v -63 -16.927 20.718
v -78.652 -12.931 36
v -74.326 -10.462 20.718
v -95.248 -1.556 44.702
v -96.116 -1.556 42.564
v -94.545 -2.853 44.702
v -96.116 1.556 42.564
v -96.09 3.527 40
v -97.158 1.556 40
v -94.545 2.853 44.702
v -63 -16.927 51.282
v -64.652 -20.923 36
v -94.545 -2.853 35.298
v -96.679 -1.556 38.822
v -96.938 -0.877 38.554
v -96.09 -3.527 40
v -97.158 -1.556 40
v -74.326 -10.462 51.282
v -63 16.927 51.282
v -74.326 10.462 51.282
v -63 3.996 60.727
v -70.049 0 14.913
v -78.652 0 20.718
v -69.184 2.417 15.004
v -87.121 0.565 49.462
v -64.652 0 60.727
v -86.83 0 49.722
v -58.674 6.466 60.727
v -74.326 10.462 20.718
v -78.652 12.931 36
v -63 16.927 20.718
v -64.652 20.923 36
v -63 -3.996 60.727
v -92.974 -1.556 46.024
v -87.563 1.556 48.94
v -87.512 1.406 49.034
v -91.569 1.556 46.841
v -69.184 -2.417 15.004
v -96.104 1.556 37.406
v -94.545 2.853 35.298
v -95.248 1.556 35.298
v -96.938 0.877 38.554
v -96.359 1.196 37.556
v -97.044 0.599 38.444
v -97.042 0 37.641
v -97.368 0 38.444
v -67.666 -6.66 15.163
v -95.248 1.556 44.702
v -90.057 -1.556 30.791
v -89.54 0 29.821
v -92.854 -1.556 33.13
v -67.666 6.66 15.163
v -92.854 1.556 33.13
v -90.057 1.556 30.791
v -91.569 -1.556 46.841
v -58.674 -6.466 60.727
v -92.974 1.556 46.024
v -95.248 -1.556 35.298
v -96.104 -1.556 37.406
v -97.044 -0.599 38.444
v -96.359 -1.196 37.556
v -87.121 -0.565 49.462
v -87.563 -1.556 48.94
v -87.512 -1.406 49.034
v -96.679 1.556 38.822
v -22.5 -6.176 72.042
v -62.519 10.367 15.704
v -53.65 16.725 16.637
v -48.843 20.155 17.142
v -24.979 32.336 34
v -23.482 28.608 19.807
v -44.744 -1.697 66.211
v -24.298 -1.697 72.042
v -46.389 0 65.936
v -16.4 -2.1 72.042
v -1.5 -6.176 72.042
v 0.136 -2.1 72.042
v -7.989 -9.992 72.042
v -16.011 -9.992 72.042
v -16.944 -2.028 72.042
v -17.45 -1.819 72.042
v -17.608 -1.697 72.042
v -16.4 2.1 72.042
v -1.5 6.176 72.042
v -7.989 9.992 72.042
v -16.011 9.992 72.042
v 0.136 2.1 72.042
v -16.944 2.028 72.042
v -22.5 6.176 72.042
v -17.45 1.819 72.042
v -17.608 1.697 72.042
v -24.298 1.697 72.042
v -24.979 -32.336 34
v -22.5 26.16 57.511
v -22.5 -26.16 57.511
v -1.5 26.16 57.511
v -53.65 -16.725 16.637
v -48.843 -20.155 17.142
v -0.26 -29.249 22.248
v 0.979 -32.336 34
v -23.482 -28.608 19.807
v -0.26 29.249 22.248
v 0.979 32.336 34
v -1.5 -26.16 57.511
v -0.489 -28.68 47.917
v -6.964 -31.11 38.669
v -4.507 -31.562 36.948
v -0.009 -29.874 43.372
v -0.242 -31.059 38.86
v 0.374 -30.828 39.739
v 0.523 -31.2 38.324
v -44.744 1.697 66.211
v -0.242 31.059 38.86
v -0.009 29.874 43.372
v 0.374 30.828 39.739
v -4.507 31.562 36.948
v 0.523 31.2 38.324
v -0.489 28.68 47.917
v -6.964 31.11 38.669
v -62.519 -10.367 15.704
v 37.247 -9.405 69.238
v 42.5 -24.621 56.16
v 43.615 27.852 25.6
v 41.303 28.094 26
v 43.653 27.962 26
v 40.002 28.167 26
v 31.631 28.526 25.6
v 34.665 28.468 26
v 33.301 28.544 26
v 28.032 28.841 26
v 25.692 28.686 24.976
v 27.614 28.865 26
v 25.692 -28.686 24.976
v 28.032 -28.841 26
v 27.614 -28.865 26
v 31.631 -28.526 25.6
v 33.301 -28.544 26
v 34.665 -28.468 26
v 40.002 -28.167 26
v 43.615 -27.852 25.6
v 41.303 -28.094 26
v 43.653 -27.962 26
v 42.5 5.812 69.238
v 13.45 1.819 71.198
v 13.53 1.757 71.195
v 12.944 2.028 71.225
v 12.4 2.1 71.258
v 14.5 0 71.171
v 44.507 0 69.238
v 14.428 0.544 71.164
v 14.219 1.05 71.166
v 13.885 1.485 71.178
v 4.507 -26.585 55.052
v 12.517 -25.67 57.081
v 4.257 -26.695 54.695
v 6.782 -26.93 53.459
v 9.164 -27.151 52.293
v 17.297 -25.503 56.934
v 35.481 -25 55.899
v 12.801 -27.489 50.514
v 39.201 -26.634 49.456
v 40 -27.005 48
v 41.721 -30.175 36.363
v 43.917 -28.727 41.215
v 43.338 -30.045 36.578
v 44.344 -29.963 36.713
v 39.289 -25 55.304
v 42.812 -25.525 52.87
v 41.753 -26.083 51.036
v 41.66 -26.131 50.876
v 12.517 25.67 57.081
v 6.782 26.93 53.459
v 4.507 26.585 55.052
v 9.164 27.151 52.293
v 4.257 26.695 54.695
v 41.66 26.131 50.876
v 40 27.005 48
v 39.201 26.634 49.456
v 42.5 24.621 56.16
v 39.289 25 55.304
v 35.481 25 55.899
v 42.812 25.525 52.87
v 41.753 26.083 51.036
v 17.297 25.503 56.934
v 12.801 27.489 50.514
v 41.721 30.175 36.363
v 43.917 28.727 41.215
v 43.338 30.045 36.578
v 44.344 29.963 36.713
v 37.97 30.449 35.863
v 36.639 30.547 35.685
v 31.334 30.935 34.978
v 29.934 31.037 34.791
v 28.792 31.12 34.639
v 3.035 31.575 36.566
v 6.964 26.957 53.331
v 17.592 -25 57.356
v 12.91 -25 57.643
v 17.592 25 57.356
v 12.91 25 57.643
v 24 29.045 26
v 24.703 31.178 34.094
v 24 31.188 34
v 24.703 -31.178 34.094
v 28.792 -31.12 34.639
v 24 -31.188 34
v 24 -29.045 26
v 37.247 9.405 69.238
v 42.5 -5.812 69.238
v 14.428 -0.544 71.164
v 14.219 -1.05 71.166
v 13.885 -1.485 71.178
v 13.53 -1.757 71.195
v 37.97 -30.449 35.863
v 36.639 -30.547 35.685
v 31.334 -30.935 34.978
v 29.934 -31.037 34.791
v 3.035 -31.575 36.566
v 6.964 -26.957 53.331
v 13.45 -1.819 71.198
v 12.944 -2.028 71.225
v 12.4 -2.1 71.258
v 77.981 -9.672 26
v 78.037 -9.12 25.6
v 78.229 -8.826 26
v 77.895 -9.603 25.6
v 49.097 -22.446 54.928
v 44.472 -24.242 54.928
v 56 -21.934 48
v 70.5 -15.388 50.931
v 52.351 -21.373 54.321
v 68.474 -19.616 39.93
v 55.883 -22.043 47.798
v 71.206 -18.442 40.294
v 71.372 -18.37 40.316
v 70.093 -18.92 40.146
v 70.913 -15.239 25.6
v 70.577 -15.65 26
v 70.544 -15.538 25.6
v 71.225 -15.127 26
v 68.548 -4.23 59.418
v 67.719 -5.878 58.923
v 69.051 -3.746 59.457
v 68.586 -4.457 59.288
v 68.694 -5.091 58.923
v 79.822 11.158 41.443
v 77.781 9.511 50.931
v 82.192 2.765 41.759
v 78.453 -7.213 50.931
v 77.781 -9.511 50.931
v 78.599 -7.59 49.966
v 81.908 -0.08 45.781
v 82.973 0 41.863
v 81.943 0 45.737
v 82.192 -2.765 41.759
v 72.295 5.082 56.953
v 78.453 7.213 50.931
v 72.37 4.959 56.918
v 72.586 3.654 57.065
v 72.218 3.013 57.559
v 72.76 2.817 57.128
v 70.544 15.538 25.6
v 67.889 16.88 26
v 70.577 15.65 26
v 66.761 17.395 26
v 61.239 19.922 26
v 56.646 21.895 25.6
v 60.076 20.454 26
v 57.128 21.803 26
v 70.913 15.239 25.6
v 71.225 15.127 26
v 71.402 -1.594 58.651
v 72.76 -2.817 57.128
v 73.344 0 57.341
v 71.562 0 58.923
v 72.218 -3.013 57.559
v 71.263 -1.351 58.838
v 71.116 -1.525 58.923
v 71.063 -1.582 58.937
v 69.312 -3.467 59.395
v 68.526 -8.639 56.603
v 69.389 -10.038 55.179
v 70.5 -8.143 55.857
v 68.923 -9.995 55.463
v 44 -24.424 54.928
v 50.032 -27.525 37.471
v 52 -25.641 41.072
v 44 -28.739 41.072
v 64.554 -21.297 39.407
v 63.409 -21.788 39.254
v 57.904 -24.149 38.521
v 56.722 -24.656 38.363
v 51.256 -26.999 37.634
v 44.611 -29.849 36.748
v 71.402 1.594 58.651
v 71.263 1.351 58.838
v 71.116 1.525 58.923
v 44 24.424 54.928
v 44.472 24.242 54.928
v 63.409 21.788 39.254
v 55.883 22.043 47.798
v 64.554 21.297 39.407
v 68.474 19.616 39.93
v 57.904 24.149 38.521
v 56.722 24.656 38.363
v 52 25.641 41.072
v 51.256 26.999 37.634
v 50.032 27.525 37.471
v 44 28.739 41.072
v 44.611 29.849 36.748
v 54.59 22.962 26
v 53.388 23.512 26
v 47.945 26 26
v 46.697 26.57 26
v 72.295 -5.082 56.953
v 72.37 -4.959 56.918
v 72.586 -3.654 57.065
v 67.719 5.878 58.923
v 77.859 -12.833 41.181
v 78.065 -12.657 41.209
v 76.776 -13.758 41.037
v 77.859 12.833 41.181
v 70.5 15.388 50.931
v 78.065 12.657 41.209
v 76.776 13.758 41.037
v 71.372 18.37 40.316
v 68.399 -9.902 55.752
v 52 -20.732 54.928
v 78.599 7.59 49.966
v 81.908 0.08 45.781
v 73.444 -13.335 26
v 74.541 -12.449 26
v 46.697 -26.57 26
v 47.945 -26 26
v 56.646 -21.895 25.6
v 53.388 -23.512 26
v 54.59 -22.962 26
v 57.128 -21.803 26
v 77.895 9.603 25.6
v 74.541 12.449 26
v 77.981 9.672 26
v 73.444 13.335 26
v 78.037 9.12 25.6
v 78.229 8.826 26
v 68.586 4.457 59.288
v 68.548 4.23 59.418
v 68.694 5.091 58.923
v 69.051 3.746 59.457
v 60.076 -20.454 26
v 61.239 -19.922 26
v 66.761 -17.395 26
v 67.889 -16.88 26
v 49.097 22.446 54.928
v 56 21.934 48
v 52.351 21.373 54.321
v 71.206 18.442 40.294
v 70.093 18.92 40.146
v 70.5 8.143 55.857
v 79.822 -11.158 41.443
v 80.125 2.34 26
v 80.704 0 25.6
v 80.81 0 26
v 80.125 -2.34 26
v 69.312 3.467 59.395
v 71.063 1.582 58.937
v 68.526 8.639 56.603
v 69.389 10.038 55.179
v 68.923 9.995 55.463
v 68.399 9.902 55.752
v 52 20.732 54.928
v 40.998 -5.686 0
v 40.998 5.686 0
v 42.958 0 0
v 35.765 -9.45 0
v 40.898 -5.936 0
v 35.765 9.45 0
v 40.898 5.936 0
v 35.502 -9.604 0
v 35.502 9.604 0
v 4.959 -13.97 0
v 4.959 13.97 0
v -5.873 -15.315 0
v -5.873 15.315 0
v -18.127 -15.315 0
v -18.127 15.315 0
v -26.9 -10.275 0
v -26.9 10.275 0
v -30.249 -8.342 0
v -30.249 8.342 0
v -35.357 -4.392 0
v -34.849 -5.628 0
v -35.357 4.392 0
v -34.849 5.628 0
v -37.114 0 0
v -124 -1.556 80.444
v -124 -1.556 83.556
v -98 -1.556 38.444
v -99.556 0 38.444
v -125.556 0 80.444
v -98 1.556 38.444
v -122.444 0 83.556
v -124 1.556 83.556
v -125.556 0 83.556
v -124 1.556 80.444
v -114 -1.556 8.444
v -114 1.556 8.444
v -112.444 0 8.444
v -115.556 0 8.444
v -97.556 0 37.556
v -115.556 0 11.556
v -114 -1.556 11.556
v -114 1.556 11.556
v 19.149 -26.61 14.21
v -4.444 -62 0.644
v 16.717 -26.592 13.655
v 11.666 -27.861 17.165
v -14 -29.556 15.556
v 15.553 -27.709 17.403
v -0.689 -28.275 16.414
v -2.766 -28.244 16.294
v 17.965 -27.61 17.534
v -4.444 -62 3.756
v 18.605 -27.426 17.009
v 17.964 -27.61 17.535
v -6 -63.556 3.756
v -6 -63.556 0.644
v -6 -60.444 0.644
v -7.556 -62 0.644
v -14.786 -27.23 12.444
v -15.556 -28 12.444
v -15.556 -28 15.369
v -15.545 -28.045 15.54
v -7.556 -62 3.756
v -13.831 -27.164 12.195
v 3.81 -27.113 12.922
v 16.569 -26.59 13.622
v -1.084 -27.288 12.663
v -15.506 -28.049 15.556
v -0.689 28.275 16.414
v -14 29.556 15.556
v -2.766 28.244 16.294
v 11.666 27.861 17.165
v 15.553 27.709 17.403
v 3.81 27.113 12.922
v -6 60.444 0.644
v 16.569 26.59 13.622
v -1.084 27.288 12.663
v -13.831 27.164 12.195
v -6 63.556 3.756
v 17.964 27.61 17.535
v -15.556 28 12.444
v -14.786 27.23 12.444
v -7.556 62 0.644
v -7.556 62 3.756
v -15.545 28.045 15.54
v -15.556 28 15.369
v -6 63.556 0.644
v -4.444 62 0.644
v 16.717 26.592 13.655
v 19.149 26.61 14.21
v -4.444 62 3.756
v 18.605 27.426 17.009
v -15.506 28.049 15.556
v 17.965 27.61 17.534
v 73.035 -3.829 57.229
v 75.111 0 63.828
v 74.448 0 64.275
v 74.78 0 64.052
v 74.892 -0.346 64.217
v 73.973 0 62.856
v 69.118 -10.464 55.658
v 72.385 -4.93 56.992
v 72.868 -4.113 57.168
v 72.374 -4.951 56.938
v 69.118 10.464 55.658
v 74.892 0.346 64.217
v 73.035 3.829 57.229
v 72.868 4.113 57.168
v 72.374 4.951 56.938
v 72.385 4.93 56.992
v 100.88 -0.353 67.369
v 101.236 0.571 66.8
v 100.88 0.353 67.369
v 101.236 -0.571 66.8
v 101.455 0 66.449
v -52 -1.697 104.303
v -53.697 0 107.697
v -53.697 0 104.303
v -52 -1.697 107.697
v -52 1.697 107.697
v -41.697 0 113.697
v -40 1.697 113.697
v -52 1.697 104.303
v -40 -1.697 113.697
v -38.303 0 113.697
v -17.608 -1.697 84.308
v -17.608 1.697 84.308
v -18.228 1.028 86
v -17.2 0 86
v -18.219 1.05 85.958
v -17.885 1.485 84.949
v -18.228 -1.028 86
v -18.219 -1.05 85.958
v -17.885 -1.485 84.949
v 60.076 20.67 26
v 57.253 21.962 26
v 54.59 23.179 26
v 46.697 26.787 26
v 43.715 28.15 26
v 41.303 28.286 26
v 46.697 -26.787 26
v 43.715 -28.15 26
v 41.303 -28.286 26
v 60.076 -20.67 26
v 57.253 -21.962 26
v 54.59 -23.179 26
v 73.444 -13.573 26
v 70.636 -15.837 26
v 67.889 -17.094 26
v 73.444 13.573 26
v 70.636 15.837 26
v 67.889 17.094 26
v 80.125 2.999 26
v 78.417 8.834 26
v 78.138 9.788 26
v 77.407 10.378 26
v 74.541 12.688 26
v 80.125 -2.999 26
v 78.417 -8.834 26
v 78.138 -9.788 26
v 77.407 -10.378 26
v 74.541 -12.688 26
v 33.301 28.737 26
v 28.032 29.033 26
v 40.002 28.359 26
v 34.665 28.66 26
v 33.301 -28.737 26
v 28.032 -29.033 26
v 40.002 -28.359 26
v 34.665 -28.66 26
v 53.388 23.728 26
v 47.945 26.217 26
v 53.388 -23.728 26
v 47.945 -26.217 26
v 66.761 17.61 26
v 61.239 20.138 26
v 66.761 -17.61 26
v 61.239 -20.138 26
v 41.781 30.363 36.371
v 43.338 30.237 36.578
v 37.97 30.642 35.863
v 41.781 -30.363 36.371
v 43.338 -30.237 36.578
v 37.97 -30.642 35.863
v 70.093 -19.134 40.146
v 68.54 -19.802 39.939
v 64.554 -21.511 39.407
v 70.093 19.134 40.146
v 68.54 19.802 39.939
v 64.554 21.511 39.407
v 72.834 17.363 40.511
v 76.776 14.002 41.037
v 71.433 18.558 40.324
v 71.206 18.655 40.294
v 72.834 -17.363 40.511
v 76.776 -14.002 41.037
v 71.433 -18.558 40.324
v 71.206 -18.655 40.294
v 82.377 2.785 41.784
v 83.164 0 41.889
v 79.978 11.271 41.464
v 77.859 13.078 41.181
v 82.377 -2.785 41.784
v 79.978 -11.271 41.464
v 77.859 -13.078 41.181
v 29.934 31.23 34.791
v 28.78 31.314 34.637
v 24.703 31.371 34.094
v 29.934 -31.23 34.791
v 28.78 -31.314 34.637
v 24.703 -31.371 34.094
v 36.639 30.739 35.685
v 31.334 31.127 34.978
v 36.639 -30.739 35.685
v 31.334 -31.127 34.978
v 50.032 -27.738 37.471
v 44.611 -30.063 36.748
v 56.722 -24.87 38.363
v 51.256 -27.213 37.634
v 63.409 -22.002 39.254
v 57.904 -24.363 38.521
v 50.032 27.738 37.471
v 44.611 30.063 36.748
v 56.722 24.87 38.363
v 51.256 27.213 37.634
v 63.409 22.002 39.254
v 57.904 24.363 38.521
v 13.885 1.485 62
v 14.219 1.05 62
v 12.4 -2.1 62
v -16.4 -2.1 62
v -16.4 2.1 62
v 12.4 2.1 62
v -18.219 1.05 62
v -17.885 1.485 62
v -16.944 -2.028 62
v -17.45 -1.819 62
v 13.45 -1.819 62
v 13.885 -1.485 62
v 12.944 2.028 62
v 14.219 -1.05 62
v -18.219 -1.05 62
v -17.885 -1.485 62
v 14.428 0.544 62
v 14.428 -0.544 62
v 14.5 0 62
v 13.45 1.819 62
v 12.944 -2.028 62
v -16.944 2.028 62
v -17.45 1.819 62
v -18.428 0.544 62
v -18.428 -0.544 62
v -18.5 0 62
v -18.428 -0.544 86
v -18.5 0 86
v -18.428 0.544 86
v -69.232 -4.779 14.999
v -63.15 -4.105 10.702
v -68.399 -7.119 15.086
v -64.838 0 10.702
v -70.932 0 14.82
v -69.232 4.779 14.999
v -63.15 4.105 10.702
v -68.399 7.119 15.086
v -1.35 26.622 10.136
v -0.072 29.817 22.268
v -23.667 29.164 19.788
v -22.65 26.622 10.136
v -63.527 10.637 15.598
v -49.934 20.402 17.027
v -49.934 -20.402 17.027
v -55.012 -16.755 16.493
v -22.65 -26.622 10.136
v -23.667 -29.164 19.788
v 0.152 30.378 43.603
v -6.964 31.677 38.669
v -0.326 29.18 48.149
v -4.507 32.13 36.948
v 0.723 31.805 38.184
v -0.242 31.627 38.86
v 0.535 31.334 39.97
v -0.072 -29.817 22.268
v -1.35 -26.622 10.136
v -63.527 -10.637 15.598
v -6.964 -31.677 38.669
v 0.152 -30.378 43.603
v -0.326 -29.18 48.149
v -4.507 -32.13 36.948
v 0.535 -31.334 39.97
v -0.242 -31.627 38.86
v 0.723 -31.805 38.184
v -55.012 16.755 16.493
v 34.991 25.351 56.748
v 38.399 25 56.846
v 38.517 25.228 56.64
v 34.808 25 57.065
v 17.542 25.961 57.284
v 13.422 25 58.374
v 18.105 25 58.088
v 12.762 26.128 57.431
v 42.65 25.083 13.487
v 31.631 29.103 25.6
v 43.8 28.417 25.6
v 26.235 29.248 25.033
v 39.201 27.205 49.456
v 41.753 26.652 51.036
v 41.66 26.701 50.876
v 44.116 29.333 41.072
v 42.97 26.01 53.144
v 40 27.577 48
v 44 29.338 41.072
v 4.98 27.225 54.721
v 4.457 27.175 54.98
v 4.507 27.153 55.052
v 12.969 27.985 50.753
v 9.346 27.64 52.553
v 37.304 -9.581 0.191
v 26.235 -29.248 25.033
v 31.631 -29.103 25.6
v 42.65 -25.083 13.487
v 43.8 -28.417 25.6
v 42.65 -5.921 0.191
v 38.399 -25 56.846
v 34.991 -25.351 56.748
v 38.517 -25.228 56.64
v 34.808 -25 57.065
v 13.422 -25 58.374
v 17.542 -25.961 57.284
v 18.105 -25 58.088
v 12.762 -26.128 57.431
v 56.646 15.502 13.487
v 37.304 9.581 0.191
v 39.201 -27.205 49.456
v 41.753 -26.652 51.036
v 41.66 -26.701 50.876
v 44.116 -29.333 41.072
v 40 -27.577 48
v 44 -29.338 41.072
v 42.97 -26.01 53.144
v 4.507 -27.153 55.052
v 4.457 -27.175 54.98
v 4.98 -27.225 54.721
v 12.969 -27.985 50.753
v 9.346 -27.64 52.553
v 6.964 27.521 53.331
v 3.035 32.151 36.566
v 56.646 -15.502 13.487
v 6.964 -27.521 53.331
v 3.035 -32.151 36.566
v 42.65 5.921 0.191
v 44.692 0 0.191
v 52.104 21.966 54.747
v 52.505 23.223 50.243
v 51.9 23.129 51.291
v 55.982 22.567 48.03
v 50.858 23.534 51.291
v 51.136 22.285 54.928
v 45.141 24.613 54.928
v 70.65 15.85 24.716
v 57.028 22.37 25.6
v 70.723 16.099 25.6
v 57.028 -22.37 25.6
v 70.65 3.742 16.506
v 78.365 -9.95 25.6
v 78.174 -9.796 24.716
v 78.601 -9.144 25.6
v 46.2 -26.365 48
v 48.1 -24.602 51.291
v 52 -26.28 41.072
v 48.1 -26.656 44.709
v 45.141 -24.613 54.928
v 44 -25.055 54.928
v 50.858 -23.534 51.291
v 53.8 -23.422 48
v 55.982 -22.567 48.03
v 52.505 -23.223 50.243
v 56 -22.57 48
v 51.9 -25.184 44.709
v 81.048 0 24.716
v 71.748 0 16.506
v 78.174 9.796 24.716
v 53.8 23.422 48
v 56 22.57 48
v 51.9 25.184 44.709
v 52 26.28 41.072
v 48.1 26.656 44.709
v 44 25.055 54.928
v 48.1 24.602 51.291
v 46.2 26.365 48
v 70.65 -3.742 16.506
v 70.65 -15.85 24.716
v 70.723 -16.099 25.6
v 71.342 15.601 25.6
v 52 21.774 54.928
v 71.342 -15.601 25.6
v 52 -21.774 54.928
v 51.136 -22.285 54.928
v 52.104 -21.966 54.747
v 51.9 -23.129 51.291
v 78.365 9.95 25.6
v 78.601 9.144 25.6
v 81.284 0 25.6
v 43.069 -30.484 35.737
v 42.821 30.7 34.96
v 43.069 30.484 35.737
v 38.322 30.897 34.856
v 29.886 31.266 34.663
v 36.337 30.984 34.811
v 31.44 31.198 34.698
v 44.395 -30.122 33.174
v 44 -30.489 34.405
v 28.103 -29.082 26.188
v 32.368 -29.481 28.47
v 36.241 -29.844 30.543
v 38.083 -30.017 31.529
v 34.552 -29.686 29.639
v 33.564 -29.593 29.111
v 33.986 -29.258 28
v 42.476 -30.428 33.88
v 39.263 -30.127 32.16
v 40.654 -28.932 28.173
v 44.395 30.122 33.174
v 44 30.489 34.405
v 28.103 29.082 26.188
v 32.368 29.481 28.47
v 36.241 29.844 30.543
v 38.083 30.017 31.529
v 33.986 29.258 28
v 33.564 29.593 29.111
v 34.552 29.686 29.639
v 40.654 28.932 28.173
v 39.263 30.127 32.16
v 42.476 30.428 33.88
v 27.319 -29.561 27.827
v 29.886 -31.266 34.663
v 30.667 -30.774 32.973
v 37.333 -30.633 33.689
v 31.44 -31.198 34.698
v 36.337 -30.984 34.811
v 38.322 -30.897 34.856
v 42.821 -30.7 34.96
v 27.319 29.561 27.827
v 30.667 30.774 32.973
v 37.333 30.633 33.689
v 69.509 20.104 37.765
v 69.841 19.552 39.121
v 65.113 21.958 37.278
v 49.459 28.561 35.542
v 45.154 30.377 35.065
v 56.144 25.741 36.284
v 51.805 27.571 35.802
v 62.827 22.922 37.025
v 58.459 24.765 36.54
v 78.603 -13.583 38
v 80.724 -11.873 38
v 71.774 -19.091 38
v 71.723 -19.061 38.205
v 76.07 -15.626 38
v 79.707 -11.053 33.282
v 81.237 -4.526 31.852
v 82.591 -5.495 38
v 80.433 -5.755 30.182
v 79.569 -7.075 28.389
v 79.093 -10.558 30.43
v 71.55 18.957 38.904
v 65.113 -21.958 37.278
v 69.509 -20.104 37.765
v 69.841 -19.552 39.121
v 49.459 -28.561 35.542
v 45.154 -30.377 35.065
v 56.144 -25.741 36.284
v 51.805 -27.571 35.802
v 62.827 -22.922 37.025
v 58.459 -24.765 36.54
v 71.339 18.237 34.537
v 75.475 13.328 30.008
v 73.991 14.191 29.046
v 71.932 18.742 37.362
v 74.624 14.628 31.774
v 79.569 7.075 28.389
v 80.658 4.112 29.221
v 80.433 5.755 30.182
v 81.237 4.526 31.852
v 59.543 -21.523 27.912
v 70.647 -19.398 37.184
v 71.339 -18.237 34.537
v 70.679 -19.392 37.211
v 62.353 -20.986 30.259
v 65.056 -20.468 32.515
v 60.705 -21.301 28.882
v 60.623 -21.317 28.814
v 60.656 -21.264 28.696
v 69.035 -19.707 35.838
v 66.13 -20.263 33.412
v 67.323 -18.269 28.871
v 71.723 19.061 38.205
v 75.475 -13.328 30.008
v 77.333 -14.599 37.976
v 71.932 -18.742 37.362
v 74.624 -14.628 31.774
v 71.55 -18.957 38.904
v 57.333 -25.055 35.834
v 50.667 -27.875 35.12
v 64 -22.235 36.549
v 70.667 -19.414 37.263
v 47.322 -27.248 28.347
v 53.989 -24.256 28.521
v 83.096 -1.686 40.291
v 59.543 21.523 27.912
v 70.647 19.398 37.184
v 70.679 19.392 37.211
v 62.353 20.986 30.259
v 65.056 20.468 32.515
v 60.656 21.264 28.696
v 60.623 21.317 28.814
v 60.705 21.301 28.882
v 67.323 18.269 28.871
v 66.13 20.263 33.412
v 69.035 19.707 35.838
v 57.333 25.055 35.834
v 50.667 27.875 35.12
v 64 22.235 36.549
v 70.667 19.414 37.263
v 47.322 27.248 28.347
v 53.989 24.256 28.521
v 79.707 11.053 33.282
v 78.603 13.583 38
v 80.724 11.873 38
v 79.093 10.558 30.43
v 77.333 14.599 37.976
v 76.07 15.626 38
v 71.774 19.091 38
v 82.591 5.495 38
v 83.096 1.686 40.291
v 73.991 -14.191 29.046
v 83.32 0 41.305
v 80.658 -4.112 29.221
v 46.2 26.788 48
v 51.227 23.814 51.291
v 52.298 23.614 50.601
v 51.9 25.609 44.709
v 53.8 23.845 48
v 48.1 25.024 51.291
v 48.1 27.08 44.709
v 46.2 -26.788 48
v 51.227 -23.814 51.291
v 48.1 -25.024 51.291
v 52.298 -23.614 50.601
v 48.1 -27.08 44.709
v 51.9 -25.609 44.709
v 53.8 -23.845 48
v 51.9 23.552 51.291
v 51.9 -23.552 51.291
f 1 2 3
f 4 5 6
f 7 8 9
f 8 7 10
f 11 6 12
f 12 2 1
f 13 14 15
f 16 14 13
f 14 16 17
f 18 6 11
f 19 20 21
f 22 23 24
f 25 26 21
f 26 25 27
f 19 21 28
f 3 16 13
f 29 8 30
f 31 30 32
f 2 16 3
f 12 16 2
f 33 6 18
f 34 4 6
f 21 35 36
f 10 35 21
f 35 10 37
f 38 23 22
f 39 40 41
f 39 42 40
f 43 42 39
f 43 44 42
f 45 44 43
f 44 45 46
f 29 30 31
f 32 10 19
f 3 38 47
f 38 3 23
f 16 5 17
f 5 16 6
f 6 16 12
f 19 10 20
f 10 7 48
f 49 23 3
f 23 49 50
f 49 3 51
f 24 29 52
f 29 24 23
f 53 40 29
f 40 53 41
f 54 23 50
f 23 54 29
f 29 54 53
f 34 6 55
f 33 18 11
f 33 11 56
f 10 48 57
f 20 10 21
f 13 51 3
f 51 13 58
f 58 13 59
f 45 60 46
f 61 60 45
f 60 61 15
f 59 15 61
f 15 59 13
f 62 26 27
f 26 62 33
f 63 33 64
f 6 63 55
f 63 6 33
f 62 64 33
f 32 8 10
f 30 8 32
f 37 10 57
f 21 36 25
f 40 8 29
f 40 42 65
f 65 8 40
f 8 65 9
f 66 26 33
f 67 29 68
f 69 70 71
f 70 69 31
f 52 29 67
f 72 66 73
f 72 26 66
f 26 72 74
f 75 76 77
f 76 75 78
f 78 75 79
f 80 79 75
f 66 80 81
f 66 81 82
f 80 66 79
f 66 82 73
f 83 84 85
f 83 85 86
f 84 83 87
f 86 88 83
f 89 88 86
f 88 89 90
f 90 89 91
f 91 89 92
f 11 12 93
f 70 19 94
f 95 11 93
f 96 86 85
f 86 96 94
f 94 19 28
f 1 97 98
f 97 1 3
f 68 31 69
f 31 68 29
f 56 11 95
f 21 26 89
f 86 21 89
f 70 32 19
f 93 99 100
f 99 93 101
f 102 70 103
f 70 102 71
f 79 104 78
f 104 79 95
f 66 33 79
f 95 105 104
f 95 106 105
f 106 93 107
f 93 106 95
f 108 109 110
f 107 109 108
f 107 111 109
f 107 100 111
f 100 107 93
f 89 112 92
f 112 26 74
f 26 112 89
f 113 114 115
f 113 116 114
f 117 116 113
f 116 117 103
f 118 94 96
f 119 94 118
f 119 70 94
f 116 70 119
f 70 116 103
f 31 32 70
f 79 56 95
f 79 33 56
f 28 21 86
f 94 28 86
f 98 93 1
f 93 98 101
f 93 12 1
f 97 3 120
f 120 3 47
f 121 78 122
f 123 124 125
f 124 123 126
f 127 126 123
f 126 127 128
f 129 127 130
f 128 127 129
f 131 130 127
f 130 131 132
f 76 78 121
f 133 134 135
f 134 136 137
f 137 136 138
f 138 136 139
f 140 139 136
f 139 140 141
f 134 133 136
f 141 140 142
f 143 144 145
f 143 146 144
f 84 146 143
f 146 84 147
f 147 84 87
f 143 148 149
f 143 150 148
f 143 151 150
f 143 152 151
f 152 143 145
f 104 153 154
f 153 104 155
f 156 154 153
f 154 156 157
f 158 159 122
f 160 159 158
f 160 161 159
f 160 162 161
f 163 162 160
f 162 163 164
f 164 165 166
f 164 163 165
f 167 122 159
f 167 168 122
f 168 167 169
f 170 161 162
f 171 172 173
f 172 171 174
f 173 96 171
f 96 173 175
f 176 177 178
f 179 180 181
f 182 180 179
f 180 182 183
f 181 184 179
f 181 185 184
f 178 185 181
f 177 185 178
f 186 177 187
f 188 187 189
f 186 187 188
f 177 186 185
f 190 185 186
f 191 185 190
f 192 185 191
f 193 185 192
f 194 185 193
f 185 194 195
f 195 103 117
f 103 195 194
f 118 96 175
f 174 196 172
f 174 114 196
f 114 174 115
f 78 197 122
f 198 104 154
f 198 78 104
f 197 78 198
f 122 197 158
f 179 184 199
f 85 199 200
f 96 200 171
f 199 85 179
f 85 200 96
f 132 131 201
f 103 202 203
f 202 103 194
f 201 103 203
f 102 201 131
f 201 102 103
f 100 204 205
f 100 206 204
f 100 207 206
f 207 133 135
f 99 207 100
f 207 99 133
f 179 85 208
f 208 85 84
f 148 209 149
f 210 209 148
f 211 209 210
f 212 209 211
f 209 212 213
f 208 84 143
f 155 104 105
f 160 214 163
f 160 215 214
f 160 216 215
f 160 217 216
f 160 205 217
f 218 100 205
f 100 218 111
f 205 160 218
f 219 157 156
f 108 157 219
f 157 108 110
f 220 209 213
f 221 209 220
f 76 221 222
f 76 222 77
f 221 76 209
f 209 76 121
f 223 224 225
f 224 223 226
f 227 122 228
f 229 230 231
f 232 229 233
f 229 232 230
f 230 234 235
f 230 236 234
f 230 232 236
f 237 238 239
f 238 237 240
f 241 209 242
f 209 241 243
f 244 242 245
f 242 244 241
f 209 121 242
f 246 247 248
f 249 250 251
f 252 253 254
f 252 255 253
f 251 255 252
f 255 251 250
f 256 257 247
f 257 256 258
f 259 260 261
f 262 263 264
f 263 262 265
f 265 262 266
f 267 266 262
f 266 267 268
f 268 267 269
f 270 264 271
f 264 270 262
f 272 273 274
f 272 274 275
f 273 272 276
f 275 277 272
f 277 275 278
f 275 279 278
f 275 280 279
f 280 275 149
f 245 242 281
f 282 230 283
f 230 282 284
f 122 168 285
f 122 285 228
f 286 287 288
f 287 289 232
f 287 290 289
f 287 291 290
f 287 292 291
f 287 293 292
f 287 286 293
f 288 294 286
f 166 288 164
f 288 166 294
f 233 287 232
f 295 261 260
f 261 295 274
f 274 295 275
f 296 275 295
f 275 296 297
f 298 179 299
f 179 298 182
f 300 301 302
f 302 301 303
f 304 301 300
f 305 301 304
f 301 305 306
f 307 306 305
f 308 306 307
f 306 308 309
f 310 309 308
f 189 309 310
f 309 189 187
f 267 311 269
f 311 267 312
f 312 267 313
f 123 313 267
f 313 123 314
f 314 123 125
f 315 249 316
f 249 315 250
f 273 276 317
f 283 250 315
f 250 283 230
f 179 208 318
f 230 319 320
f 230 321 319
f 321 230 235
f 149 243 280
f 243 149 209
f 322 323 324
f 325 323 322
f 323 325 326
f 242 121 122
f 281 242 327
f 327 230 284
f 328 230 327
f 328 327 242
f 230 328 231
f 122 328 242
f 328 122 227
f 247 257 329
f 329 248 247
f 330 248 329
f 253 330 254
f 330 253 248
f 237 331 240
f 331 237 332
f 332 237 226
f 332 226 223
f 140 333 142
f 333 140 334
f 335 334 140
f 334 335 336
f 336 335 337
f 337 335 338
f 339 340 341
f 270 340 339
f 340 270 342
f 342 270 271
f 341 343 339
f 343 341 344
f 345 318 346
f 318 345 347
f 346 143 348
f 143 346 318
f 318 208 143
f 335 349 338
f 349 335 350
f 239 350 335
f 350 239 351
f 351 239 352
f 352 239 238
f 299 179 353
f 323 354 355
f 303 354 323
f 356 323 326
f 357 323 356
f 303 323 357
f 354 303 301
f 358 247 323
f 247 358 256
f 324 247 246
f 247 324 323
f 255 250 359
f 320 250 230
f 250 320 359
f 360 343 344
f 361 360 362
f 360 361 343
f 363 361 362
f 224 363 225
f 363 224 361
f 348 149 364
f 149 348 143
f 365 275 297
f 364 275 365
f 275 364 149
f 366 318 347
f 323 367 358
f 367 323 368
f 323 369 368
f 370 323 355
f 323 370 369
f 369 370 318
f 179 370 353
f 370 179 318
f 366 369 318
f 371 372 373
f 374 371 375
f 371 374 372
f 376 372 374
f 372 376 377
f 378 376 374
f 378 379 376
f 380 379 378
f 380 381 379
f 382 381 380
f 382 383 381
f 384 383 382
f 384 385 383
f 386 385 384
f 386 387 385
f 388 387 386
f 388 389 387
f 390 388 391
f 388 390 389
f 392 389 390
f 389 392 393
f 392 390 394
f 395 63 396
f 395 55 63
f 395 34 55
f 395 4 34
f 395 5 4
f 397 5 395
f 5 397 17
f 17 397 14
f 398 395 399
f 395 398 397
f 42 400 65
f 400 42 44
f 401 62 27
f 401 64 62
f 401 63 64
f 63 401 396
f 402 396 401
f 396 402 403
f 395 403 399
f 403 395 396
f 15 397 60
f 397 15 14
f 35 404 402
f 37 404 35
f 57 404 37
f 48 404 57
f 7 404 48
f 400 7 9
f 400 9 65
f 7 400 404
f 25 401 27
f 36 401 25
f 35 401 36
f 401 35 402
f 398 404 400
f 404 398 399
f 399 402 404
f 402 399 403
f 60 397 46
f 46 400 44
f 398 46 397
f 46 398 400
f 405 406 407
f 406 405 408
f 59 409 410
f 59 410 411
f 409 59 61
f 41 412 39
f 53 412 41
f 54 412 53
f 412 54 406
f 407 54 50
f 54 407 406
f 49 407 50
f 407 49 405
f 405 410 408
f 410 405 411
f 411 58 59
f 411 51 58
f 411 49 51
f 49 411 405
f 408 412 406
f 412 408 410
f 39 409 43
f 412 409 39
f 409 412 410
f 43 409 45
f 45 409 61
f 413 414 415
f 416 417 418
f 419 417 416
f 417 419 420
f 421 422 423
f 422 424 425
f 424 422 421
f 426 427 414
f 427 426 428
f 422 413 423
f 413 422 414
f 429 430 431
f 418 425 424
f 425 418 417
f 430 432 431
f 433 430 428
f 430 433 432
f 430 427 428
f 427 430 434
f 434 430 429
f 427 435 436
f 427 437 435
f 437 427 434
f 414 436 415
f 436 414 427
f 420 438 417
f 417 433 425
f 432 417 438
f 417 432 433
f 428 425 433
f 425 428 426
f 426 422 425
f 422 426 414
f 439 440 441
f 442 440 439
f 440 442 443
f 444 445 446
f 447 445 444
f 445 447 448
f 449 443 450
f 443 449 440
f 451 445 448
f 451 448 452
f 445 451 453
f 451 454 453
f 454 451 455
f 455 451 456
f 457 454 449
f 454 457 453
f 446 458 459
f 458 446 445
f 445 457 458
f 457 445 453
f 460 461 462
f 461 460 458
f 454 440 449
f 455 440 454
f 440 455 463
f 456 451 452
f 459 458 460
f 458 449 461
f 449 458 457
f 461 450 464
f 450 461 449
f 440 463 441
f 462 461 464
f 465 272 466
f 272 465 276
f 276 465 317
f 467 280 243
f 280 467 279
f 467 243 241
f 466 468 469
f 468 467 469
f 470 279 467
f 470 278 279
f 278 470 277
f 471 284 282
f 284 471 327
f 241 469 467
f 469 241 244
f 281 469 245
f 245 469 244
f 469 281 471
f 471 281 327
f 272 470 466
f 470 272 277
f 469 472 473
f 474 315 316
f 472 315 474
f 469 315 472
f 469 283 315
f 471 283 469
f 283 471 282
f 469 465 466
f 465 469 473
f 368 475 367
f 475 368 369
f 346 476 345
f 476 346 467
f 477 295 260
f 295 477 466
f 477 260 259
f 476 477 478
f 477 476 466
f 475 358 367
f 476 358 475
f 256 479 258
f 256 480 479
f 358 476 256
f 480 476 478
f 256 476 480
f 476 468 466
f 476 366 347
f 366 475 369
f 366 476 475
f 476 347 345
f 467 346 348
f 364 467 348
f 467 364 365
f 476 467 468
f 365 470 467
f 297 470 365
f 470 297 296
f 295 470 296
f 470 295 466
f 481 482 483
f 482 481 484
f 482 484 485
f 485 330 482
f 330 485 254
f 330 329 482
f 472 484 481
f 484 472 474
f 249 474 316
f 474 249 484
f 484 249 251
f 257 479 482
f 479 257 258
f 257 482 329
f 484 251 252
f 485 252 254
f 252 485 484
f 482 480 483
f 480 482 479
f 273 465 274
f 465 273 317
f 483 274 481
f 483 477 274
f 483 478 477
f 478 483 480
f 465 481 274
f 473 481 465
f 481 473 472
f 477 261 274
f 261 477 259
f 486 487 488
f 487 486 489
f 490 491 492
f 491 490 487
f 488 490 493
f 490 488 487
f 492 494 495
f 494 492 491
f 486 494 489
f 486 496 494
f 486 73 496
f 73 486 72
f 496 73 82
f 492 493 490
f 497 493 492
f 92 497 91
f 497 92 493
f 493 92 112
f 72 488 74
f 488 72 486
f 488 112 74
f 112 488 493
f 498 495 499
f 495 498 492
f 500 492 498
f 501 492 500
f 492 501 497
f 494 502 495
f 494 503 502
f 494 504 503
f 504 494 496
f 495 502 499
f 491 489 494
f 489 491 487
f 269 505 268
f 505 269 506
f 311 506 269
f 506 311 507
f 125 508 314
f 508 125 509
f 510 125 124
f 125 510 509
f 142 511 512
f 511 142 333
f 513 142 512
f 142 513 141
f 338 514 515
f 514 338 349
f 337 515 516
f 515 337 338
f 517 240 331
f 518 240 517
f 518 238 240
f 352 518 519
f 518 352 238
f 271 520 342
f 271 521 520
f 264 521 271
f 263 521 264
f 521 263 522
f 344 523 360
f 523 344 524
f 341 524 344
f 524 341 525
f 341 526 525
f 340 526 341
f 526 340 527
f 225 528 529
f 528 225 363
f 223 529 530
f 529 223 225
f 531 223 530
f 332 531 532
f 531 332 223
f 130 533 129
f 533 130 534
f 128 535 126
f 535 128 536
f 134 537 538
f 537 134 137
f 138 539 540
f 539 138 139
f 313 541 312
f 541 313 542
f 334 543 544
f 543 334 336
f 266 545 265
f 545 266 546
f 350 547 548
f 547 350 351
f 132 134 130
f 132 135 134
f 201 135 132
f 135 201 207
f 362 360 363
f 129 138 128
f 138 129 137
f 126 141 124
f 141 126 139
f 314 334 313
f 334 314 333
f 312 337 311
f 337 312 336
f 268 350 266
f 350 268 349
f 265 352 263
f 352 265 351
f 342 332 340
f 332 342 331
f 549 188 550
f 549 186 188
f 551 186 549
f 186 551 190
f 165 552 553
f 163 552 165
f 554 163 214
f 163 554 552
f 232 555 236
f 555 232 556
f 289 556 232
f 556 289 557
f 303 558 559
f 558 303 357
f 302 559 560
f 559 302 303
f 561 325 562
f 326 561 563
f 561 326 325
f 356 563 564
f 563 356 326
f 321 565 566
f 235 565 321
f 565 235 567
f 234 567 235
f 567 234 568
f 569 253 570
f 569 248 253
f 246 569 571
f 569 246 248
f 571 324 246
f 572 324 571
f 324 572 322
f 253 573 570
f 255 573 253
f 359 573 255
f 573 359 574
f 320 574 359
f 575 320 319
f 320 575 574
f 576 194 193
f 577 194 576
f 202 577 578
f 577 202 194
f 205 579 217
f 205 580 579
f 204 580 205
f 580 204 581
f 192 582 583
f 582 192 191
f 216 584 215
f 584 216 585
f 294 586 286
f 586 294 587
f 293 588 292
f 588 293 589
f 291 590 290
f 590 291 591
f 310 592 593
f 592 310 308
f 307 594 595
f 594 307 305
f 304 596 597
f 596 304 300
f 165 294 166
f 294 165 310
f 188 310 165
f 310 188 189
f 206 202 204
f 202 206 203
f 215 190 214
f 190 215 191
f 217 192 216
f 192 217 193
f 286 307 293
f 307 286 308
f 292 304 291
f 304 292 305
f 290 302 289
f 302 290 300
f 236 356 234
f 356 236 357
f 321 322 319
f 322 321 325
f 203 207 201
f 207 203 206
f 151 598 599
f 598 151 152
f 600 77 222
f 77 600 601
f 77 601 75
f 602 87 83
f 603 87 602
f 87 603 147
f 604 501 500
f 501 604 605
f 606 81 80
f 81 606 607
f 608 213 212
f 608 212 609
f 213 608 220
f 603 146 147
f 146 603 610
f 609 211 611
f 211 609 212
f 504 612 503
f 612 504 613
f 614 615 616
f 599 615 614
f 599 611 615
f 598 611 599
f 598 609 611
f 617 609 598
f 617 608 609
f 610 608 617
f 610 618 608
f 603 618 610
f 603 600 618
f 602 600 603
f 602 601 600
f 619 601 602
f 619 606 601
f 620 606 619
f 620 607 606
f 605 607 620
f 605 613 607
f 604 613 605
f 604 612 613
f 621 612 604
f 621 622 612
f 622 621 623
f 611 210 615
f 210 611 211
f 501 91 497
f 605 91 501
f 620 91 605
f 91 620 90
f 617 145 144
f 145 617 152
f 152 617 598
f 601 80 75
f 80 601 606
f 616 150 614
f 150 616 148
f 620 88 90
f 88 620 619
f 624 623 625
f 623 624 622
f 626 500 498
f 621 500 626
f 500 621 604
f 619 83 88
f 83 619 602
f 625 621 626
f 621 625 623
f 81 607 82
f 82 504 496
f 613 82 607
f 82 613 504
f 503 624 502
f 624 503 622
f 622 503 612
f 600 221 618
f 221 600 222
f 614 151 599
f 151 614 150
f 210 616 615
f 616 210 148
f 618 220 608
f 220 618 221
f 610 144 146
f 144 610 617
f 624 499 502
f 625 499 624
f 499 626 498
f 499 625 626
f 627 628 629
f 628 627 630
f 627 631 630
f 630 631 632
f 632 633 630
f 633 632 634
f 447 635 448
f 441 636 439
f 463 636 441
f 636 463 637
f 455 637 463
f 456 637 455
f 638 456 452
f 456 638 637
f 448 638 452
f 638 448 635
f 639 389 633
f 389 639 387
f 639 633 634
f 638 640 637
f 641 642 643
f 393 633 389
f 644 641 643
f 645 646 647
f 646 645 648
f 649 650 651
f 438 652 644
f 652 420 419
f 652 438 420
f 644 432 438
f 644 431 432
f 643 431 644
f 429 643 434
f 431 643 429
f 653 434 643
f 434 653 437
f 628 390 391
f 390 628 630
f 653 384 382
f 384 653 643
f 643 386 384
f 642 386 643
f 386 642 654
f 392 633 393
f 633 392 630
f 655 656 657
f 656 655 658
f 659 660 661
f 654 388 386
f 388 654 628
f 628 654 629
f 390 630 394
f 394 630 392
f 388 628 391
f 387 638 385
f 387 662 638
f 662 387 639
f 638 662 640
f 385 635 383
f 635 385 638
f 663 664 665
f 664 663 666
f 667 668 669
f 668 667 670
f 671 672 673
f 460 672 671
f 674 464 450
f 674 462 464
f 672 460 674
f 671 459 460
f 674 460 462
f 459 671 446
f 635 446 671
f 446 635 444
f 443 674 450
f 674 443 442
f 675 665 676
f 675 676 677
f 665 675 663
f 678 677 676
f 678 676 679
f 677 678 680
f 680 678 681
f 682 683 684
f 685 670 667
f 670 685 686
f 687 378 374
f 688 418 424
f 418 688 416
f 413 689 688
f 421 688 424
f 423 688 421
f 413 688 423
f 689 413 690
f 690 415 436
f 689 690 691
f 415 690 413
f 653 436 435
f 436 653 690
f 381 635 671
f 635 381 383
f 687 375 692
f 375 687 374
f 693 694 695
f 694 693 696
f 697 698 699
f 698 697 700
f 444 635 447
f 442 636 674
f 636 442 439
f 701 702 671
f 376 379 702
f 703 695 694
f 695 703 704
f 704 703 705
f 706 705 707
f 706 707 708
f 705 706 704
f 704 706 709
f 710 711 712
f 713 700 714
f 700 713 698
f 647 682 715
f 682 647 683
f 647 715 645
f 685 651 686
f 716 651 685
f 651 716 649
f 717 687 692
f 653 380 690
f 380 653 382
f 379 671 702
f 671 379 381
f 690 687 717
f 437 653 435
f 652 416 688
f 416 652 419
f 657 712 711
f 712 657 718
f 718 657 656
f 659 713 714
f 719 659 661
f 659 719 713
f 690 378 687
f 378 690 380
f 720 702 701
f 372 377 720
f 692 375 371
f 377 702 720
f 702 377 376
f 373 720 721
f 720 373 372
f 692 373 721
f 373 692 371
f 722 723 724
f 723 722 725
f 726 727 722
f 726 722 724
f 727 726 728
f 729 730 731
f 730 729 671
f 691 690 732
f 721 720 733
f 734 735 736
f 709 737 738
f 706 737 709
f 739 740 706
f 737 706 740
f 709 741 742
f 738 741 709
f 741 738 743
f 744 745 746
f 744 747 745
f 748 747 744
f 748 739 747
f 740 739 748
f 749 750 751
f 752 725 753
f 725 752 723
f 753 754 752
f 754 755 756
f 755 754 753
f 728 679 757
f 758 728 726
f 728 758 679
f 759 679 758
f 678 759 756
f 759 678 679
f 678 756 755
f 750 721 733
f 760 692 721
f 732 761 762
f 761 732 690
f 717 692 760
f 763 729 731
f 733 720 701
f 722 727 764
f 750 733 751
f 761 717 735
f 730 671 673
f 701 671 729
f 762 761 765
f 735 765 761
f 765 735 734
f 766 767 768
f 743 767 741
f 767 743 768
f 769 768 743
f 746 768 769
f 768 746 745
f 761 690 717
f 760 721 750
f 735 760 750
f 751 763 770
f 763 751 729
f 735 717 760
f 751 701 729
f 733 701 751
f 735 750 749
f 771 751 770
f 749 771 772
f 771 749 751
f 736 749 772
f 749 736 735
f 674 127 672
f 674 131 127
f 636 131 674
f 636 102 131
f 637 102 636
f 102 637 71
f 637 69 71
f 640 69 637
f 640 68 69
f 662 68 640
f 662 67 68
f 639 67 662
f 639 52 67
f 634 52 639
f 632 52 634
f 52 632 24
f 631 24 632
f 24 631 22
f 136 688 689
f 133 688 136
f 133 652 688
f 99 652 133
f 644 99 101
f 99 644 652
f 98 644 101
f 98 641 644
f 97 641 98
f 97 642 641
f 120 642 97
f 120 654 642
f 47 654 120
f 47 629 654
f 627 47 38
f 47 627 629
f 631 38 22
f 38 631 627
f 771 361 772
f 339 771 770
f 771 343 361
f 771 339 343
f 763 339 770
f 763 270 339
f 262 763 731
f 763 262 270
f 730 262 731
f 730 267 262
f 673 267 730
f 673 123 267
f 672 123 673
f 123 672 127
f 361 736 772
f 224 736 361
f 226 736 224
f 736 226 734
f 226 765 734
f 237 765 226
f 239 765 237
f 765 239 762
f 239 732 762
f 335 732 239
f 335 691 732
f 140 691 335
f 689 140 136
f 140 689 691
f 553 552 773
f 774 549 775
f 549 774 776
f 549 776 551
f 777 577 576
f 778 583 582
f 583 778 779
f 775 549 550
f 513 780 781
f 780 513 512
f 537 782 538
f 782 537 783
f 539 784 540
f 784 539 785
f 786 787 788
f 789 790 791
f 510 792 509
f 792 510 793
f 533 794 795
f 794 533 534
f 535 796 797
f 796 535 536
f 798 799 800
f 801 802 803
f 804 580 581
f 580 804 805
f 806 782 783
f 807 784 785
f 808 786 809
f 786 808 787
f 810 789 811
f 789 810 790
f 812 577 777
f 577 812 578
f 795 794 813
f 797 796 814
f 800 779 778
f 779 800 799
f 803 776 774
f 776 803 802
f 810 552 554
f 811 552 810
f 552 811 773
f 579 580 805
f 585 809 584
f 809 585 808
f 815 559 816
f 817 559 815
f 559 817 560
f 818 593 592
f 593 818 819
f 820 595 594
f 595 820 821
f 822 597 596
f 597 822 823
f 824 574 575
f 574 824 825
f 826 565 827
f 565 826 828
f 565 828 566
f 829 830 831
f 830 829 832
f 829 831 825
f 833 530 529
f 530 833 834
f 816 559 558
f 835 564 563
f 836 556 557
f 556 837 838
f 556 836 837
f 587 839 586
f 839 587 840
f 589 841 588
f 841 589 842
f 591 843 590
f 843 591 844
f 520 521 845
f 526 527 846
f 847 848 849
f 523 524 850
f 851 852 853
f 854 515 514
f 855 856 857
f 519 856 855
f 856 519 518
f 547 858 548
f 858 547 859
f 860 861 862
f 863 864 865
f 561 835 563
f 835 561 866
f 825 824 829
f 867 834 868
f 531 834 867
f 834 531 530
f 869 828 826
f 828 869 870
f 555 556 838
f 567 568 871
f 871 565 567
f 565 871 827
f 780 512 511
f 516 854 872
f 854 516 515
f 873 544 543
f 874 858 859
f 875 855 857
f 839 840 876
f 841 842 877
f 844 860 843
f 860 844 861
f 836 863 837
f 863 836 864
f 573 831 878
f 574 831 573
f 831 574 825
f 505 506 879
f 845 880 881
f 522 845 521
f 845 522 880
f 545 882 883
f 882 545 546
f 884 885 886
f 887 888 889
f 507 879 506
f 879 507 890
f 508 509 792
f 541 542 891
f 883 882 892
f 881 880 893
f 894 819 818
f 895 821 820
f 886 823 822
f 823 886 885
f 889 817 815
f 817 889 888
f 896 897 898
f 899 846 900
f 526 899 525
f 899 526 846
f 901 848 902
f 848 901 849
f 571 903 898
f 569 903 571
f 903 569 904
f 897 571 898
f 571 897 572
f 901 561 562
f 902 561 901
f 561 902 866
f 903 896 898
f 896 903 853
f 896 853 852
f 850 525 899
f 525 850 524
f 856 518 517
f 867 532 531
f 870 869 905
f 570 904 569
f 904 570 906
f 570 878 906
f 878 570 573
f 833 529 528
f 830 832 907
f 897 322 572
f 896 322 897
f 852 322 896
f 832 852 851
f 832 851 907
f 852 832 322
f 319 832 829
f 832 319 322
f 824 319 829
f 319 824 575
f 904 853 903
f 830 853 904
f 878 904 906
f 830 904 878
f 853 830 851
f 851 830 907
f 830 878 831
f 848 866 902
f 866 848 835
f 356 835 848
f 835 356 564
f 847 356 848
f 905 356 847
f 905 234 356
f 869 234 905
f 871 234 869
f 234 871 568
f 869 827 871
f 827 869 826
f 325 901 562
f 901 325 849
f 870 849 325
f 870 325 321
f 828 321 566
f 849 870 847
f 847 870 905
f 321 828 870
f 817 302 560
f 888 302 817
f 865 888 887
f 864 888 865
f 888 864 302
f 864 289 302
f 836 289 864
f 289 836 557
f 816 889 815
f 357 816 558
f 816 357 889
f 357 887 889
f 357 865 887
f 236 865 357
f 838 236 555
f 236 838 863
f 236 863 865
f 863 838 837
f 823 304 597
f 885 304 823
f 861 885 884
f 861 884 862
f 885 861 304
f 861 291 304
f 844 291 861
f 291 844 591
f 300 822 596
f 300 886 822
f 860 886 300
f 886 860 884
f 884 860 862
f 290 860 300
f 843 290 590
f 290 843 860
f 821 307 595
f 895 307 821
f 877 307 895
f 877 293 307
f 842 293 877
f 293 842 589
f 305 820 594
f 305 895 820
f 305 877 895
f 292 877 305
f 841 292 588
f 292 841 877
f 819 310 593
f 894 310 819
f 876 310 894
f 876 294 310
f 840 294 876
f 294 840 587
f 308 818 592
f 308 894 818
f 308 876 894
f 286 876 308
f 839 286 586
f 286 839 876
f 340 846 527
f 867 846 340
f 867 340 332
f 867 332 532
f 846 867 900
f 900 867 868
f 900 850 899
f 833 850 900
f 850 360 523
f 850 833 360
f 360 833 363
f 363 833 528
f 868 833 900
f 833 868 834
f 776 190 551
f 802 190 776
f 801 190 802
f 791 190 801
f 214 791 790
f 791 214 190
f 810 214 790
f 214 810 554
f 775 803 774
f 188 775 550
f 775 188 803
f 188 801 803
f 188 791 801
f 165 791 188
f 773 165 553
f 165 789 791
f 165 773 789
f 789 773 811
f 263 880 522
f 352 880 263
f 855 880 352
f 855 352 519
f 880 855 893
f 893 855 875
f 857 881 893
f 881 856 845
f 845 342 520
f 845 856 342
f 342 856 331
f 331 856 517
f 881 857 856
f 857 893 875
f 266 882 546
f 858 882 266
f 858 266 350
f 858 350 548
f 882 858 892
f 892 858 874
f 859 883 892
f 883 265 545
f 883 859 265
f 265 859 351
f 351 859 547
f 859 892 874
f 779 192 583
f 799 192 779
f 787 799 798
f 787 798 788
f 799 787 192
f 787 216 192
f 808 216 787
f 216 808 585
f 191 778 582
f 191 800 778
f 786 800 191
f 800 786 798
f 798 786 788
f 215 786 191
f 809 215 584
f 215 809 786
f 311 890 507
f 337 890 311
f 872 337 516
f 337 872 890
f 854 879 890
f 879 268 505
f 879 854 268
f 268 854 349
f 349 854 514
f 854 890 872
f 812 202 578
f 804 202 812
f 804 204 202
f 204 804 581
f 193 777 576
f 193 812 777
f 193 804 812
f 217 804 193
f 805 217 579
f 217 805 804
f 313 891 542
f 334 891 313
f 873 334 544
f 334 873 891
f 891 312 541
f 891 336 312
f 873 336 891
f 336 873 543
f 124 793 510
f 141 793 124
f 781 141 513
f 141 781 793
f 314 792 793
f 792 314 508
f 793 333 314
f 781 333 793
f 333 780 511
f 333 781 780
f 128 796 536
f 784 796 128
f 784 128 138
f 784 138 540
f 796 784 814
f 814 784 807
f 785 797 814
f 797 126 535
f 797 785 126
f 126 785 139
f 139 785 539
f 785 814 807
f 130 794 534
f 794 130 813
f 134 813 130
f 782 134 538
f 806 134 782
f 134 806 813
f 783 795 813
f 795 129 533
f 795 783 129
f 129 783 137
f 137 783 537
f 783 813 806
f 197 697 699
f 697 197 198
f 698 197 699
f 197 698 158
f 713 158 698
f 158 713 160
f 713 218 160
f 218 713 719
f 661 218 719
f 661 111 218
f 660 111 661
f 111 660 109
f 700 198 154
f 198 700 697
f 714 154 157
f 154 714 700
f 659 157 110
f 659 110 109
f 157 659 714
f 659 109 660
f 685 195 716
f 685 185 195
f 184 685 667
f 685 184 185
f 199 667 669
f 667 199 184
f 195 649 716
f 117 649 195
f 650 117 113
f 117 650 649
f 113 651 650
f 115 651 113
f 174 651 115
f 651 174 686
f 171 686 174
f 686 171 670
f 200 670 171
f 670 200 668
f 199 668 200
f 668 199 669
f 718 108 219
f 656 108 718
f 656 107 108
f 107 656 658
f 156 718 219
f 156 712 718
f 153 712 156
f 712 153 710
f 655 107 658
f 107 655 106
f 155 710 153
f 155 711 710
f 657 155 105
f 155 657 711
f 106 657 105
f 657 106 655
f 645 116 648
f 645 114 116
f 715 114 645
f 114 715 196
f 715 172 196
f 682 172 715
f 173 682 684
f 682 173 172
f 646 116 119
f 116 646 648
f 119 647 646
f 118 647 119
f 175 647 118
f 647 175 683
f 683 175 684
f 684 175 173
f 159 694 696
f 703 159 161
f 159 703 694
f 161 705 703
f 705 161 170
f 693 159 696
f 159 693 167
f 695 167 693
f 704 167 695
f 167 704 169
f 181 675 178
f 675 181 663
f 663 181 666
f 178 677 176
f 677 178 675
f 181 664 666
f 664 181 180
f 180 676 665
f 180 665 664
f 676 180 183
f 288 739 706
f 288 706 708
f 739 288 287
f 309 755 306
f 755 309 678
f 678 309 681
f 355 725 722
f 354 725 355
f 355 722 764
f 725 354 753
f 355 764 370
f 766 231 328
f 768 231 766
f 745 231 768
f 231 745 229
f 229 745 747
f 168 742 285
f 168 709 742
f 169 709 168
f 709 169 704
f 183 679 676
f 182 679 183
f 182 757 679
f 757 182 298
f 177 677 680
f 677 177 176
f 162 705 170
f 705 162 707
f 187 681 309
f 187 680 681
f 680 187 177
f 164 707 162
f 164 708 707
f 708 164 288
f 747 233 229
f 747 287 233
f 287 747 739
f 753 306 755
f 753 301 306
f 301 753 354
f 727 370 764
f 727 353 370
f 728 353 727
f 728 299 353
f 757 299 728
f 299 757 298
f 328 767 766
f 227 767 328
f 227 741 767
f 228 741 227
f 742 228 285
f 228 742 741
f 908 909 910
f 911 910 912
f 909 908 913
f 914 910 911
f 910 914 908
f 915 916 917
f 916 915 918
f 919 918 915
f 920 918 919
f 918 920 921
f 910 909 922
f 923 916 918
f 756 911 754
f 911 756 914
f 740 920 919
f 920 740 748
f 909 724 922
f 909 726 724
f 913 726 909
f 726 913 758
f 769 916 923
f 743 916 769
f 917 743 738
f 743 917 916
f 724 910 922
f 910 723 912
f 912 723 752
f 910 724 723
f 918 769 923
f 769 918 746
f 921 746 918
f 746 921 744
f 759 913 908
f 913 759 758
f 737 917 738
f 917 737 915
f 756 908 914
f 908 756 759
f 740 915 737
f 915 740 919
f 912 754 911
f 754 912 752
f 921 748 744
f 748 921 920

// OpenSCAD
// file: lib/bank_common.scad
// Shared parts for the Mega Sharpedo coin banks.
// Units: millimetres. Target printer: any FDM printer, 0.2 mm layers.

// ---- Palette (Mega Sharpedo) -------------------------------------------
C_NAVY   = [0.11, 0.20, 0.42];   // upper body
C_BLUE   = [0.18, 0.33, 0.62];   // fin highlights
C_RED    = [0.72, 0.13, 0.16];   // lower jaw / underside
C_MAW    = [0.35, 0.03, 0.06];   // inside of the mouth
C_CREAM  = [0.96, 0.92, 0.80];   // belly band
C_YELLOW = [1.00, 0.80, 0.10];   // nose drill, scars, eye ring
C_WHITE  = [0.98, 0.98, 0.96];   // teeth
C_BLACK  = [0.05, 0.05, 0.07];   // pupils
C_WATER  = [0.30, 0.62, 0.85];   // splash base
C_FOAM   = [0.90, 0.96, 1.00];

// ---- Print settings -----------------------------------------------------
WALL        = 2.4;   // shell thickness
SLOT_LEN    = 33;    // fits every US / EUR / GBP coin up to a US half dollar
SLOT_W      = 4.2;
PLUG_R      = 20;    // through-hole radius in the floor
PLUG_FLOOR  = 3;     // floor thickness the plug locks against
PLUG_CLEAR  = 0.3;   // fit clearance per side

// Ellipsoid "blob": p = [x, z, rx, ry, rz]
module blob(p, inset = 0, fn = 48)
    translate([p[0], 0, p[1]])
        scale([max(p[2] - inset, 0.5), max(p[3] - inset, 0.5), max(p[4] - inset, 0.5)])
            sphere(1, $fn = fn);

// Smooth sweep through a list of blobs (hull of consecutive pairs).
module spine(pts, inset = 0, fn = 48)
    for (i = [0 : len(pts) - 2])
        hull() { blob(pts[i], inset, fn); blob(pts[i + 1], inset, fn); }

// Rounded fin: hull of small spheres placed at the given 3D points.
module fin(pts, r = 2.2, fn = 16)
    hull() for (p = pts) translate(p) sphere(r, $fn = fn);

// Cone tooth pointing along +Z from its base.
module tooth(h = 6, r = 2.4)
    cylinder(h = h, r1 = r, r2 = 0.25, $fn = 12);

// Coin slot cutter, long axis along X, centred at origin, cuts along Z.
module coin_slot(depth = 40)
    hull() for (s = [-1, 1])
        translate([s * (SLOT_LEN - SLOT_W) / 2, 0, -depth / 2])
            cylinder(h = depth, d = SLOT_W, $fn = 24);

// Bayonet socket cut into a floor whose underside sits at z = 0.
// Two notches let the plug lugs through; a quarter turn locks it.
module plug_socket() {
    translate([0, 0, -1]) cylinder(h = PLUG_FLOOR + 2, r = PLUG_R, $fn = 96);
    for (a = [0, 180]) rotate(a)
        translate([PLUG_R - 2, -5.5, -1]) cube([6.5, 11, PLUG_FLOOR + 2]);
}

// Matching twist-lock plug, printed cap-down (flat on the bed).
module plug() {
    r = PLUG_R - PLUG_CLEAR;
    cap = 4;
    difference() {
        cylinder(h = cap, r = PLUG_R + 6, $fn = 96);
        // finger groove on the outside face for twisting
        translate([-PLUG_R, -2.5, -1]) cube([2 * PLUG_R, 5, 2.6]);
    }
    translate([0, 0, cap]) cylinder(h = PLUG_FLOOR + 0.4, r = r, $fn = 96);
    translate([0, 0, cap + PLUG_FLOOR + 0.4])
        difference() {
            cylinder(h = 2.2, r = r, $fn = 96);
            translate([0, 0, -1]) cylinder(h = 4, r = r - 3, $fn = 96);
        }
    for (a = [0, 180]) rotate(a)                                   // lugs
        translate([r - 3, -5, cap + PLUG_FLOOR + 0.4]) cube([6, 10, 2.2]);
}
// main file
// Mega Sharpedo coin bank — Design 3: "Torpedo"
// A faceted, low-poly take on the classic piggy-bank pose: the shark lies
// level, standing on its belly and pectoral fins, with a locked jagged grin.
// Coin slot on the back, twist-lock plug in the belly.
//
//   part = "preview"  coloured assembly (F5)
//   part = "bank"     printable shell (F6, export STL; prints upright)
//   part = "plug"     twist-lock plug (print cap-down)

include <lib/bank_common.scad>

part = "preview";

FACETS = 10;   // lower = chunkier low-poly look

// [x, z, rx, ry, rz], nose toward +X
BODY = [
    [-88, 40, 10,  6,  8],
    [-56, 36, 28, 22, 26],
    [-12, 34, 42, 34, 40],
    [ 34, 35, 34, 32, 36],
    [ 66, 38, 18, 20, 22],
];

module envelope(inset = 0)
    intersection() {
        spine(BODY, inset, FACETS);
        translate([-200, -200, inset > 0 ? PLUG_FLOOR : 0]) cube(400);
    }

// The closed grin: a sloped band across the snout.
GRIN_TOP = [[24, 34], [84, 42]];
GRIN_BOT = [[24, 26], [84, 26]];
module grin_band(grow = 0)
    rotate([90, 0, 0]) linear_extrude(height = 100, center = true)
        offset(delta = grow) polygon([GRIN_BOT[0], GRIN_BOT[1], GRIN_TOP[1], GRIN_TOP[0]]);

function lerp(a, b, t) = a + (b - a) * t;

// Interlocking triangle teeth filling the grin band.
module teeth() {
    n = 9;
    intersection() {
        envelope(-0.2);
        grin_band();
        rotate([90, 0, 0]) linear_extrude(height = 100, center = true) offset(delta = -0.3)
            for (i = [0 : n - 1]) {
                t0 = i / n; t1 = (i + 1) / n; tm = (i + 0.5) / n;
                // upper fang hangs from the top edge
                polygon([lerp(GRIN_TOP[0], GRIN_TOP[1], t0) + [0, 1],
                         lerp(GRIN_TOP[0], GRIN_TOP[1], t1) + [0, 1],
                         lerp(lerp(GRIN_BOT[0], GRIN_BOT[1], tm), lerp(GRIN_TOP[0], GRIN_TOP[1], tm), 0.12)]);
                // lower fang rises between them
                if (i < n - 1)
                    polygon([lerp(GRIN_BOT[0], GRIN_BOT[1], tm) - [0, 1],
                             lerp(GRIN_BOT[0], GRIN_BOT[1], tm + 1 / n) - [0, 1],
                             lerp(lerp(GRIN_BOT[0], GRIN_BOT[1], t1), lerp(GRIN_TOP[0], GRIN_TOP[1], t1), 0.88)]);
            }
    }
}

module dorsal_fin() fin([[-44, 0, 64], [-8, 0, 70], [-40, 0, 112], [-52, 0, 106]], 2.4, 4);
module tail_fin() {
    fin([[-84, 0, 44], [-98, 0, 40], [-124, 0, 82]], 2.2, 4);
    fin([[-84, 0, 38], [-96, 0, 36], [-114, 0, 10]], 2.2, 4);
}
module side_fins() for (s = [-1, 1])      // doubles as the front legs
    fin([[18, s * 26, 16], [-14, s * 28, 14], [-6, s * 62, 2.2]], 2.2, 4);

module nose_drill() {
    translate([74, 0, 50]) rotate([0, 58, 0]) cylinder(h = 32, r1 = 9, r2 = 0.6, $fn = 5);
    for (s = [-1, 1]) translate([68, s * 7, 54]) rotate([s * 30, 34, 0])
        cylinder(h = 14, r1 = 4, r2 = 0.4, $fn = 4);
}

module belly() translate([0, 0, -28]) rotate([0, -6, 0]) cube([400, 200, 100], center = true);

module decal(c = C_YELLOW, lift = 0.6) color(c) render() intersection() { envelope(-lift); children(); }

module side_plate(x, z, r, fn) for (s = [-1, 1])
    translate([x, s * 50, z]) rotate([90, 0, 0]) cylinder(h = 100, r = r, center = true, $fn = fn);

module scar(x, z, ang, len = 24, w = 4)
    for (s = [-1, 1]) decal()
        translate([x, s * 40, z]) rotate([0, ang, 0]) cube([w, 30, len], center = true);

module eyes() {
    decal(C_YELLOW) side_plate(48, 48, 8, 6);
    decal(C_BLACK, 1.0) side_plate(50, 48, 3.8, 6);
}

module slot_cut() translate([-2, 0, 74]) coin_slot(24);

module shell() union() {
    difference() {
        union() { envelope(); dorsal_fin(); tail_fin(); side_fins(); nose_drill(); }
        grin_band();
    }
    teeth();
}

module cavity() difference() { envelope(WALL); grin_band(WALL); }

module bank()
    difference() {
        shell();
        cavity();
        slot_cut();
        translate([-12, 0, 0]) plug_socket();
    }

module preview() {
    difference() {
        union() {
            color(C_NAVY) envelope();
            color(C_NAVY) dorsal_fin();
            color(C_NAVY) tail_fin();
            color(C_BLUE) side_fins();
            color(C_YELLOW) nose_drill();
        }
        color(C_MAW) grin_band();
        color(C_BLACK) slot_cut();
    }
    color(C_RED) render() difference() {
        intersection() { envelope(-0.6); belly(); }
        grin_band(0.4);
    }
    color(C_WHITE) render() teeth();
    scar(10, 50, 35, 30);
    scar(0, 46, 35, 20, 3);
    scar(36, 58, -30, 18, 3);
    eyes();
}

if (part == "preview") preview();
else if (part == "bank") bank();
else if (part == "plug") plug();
